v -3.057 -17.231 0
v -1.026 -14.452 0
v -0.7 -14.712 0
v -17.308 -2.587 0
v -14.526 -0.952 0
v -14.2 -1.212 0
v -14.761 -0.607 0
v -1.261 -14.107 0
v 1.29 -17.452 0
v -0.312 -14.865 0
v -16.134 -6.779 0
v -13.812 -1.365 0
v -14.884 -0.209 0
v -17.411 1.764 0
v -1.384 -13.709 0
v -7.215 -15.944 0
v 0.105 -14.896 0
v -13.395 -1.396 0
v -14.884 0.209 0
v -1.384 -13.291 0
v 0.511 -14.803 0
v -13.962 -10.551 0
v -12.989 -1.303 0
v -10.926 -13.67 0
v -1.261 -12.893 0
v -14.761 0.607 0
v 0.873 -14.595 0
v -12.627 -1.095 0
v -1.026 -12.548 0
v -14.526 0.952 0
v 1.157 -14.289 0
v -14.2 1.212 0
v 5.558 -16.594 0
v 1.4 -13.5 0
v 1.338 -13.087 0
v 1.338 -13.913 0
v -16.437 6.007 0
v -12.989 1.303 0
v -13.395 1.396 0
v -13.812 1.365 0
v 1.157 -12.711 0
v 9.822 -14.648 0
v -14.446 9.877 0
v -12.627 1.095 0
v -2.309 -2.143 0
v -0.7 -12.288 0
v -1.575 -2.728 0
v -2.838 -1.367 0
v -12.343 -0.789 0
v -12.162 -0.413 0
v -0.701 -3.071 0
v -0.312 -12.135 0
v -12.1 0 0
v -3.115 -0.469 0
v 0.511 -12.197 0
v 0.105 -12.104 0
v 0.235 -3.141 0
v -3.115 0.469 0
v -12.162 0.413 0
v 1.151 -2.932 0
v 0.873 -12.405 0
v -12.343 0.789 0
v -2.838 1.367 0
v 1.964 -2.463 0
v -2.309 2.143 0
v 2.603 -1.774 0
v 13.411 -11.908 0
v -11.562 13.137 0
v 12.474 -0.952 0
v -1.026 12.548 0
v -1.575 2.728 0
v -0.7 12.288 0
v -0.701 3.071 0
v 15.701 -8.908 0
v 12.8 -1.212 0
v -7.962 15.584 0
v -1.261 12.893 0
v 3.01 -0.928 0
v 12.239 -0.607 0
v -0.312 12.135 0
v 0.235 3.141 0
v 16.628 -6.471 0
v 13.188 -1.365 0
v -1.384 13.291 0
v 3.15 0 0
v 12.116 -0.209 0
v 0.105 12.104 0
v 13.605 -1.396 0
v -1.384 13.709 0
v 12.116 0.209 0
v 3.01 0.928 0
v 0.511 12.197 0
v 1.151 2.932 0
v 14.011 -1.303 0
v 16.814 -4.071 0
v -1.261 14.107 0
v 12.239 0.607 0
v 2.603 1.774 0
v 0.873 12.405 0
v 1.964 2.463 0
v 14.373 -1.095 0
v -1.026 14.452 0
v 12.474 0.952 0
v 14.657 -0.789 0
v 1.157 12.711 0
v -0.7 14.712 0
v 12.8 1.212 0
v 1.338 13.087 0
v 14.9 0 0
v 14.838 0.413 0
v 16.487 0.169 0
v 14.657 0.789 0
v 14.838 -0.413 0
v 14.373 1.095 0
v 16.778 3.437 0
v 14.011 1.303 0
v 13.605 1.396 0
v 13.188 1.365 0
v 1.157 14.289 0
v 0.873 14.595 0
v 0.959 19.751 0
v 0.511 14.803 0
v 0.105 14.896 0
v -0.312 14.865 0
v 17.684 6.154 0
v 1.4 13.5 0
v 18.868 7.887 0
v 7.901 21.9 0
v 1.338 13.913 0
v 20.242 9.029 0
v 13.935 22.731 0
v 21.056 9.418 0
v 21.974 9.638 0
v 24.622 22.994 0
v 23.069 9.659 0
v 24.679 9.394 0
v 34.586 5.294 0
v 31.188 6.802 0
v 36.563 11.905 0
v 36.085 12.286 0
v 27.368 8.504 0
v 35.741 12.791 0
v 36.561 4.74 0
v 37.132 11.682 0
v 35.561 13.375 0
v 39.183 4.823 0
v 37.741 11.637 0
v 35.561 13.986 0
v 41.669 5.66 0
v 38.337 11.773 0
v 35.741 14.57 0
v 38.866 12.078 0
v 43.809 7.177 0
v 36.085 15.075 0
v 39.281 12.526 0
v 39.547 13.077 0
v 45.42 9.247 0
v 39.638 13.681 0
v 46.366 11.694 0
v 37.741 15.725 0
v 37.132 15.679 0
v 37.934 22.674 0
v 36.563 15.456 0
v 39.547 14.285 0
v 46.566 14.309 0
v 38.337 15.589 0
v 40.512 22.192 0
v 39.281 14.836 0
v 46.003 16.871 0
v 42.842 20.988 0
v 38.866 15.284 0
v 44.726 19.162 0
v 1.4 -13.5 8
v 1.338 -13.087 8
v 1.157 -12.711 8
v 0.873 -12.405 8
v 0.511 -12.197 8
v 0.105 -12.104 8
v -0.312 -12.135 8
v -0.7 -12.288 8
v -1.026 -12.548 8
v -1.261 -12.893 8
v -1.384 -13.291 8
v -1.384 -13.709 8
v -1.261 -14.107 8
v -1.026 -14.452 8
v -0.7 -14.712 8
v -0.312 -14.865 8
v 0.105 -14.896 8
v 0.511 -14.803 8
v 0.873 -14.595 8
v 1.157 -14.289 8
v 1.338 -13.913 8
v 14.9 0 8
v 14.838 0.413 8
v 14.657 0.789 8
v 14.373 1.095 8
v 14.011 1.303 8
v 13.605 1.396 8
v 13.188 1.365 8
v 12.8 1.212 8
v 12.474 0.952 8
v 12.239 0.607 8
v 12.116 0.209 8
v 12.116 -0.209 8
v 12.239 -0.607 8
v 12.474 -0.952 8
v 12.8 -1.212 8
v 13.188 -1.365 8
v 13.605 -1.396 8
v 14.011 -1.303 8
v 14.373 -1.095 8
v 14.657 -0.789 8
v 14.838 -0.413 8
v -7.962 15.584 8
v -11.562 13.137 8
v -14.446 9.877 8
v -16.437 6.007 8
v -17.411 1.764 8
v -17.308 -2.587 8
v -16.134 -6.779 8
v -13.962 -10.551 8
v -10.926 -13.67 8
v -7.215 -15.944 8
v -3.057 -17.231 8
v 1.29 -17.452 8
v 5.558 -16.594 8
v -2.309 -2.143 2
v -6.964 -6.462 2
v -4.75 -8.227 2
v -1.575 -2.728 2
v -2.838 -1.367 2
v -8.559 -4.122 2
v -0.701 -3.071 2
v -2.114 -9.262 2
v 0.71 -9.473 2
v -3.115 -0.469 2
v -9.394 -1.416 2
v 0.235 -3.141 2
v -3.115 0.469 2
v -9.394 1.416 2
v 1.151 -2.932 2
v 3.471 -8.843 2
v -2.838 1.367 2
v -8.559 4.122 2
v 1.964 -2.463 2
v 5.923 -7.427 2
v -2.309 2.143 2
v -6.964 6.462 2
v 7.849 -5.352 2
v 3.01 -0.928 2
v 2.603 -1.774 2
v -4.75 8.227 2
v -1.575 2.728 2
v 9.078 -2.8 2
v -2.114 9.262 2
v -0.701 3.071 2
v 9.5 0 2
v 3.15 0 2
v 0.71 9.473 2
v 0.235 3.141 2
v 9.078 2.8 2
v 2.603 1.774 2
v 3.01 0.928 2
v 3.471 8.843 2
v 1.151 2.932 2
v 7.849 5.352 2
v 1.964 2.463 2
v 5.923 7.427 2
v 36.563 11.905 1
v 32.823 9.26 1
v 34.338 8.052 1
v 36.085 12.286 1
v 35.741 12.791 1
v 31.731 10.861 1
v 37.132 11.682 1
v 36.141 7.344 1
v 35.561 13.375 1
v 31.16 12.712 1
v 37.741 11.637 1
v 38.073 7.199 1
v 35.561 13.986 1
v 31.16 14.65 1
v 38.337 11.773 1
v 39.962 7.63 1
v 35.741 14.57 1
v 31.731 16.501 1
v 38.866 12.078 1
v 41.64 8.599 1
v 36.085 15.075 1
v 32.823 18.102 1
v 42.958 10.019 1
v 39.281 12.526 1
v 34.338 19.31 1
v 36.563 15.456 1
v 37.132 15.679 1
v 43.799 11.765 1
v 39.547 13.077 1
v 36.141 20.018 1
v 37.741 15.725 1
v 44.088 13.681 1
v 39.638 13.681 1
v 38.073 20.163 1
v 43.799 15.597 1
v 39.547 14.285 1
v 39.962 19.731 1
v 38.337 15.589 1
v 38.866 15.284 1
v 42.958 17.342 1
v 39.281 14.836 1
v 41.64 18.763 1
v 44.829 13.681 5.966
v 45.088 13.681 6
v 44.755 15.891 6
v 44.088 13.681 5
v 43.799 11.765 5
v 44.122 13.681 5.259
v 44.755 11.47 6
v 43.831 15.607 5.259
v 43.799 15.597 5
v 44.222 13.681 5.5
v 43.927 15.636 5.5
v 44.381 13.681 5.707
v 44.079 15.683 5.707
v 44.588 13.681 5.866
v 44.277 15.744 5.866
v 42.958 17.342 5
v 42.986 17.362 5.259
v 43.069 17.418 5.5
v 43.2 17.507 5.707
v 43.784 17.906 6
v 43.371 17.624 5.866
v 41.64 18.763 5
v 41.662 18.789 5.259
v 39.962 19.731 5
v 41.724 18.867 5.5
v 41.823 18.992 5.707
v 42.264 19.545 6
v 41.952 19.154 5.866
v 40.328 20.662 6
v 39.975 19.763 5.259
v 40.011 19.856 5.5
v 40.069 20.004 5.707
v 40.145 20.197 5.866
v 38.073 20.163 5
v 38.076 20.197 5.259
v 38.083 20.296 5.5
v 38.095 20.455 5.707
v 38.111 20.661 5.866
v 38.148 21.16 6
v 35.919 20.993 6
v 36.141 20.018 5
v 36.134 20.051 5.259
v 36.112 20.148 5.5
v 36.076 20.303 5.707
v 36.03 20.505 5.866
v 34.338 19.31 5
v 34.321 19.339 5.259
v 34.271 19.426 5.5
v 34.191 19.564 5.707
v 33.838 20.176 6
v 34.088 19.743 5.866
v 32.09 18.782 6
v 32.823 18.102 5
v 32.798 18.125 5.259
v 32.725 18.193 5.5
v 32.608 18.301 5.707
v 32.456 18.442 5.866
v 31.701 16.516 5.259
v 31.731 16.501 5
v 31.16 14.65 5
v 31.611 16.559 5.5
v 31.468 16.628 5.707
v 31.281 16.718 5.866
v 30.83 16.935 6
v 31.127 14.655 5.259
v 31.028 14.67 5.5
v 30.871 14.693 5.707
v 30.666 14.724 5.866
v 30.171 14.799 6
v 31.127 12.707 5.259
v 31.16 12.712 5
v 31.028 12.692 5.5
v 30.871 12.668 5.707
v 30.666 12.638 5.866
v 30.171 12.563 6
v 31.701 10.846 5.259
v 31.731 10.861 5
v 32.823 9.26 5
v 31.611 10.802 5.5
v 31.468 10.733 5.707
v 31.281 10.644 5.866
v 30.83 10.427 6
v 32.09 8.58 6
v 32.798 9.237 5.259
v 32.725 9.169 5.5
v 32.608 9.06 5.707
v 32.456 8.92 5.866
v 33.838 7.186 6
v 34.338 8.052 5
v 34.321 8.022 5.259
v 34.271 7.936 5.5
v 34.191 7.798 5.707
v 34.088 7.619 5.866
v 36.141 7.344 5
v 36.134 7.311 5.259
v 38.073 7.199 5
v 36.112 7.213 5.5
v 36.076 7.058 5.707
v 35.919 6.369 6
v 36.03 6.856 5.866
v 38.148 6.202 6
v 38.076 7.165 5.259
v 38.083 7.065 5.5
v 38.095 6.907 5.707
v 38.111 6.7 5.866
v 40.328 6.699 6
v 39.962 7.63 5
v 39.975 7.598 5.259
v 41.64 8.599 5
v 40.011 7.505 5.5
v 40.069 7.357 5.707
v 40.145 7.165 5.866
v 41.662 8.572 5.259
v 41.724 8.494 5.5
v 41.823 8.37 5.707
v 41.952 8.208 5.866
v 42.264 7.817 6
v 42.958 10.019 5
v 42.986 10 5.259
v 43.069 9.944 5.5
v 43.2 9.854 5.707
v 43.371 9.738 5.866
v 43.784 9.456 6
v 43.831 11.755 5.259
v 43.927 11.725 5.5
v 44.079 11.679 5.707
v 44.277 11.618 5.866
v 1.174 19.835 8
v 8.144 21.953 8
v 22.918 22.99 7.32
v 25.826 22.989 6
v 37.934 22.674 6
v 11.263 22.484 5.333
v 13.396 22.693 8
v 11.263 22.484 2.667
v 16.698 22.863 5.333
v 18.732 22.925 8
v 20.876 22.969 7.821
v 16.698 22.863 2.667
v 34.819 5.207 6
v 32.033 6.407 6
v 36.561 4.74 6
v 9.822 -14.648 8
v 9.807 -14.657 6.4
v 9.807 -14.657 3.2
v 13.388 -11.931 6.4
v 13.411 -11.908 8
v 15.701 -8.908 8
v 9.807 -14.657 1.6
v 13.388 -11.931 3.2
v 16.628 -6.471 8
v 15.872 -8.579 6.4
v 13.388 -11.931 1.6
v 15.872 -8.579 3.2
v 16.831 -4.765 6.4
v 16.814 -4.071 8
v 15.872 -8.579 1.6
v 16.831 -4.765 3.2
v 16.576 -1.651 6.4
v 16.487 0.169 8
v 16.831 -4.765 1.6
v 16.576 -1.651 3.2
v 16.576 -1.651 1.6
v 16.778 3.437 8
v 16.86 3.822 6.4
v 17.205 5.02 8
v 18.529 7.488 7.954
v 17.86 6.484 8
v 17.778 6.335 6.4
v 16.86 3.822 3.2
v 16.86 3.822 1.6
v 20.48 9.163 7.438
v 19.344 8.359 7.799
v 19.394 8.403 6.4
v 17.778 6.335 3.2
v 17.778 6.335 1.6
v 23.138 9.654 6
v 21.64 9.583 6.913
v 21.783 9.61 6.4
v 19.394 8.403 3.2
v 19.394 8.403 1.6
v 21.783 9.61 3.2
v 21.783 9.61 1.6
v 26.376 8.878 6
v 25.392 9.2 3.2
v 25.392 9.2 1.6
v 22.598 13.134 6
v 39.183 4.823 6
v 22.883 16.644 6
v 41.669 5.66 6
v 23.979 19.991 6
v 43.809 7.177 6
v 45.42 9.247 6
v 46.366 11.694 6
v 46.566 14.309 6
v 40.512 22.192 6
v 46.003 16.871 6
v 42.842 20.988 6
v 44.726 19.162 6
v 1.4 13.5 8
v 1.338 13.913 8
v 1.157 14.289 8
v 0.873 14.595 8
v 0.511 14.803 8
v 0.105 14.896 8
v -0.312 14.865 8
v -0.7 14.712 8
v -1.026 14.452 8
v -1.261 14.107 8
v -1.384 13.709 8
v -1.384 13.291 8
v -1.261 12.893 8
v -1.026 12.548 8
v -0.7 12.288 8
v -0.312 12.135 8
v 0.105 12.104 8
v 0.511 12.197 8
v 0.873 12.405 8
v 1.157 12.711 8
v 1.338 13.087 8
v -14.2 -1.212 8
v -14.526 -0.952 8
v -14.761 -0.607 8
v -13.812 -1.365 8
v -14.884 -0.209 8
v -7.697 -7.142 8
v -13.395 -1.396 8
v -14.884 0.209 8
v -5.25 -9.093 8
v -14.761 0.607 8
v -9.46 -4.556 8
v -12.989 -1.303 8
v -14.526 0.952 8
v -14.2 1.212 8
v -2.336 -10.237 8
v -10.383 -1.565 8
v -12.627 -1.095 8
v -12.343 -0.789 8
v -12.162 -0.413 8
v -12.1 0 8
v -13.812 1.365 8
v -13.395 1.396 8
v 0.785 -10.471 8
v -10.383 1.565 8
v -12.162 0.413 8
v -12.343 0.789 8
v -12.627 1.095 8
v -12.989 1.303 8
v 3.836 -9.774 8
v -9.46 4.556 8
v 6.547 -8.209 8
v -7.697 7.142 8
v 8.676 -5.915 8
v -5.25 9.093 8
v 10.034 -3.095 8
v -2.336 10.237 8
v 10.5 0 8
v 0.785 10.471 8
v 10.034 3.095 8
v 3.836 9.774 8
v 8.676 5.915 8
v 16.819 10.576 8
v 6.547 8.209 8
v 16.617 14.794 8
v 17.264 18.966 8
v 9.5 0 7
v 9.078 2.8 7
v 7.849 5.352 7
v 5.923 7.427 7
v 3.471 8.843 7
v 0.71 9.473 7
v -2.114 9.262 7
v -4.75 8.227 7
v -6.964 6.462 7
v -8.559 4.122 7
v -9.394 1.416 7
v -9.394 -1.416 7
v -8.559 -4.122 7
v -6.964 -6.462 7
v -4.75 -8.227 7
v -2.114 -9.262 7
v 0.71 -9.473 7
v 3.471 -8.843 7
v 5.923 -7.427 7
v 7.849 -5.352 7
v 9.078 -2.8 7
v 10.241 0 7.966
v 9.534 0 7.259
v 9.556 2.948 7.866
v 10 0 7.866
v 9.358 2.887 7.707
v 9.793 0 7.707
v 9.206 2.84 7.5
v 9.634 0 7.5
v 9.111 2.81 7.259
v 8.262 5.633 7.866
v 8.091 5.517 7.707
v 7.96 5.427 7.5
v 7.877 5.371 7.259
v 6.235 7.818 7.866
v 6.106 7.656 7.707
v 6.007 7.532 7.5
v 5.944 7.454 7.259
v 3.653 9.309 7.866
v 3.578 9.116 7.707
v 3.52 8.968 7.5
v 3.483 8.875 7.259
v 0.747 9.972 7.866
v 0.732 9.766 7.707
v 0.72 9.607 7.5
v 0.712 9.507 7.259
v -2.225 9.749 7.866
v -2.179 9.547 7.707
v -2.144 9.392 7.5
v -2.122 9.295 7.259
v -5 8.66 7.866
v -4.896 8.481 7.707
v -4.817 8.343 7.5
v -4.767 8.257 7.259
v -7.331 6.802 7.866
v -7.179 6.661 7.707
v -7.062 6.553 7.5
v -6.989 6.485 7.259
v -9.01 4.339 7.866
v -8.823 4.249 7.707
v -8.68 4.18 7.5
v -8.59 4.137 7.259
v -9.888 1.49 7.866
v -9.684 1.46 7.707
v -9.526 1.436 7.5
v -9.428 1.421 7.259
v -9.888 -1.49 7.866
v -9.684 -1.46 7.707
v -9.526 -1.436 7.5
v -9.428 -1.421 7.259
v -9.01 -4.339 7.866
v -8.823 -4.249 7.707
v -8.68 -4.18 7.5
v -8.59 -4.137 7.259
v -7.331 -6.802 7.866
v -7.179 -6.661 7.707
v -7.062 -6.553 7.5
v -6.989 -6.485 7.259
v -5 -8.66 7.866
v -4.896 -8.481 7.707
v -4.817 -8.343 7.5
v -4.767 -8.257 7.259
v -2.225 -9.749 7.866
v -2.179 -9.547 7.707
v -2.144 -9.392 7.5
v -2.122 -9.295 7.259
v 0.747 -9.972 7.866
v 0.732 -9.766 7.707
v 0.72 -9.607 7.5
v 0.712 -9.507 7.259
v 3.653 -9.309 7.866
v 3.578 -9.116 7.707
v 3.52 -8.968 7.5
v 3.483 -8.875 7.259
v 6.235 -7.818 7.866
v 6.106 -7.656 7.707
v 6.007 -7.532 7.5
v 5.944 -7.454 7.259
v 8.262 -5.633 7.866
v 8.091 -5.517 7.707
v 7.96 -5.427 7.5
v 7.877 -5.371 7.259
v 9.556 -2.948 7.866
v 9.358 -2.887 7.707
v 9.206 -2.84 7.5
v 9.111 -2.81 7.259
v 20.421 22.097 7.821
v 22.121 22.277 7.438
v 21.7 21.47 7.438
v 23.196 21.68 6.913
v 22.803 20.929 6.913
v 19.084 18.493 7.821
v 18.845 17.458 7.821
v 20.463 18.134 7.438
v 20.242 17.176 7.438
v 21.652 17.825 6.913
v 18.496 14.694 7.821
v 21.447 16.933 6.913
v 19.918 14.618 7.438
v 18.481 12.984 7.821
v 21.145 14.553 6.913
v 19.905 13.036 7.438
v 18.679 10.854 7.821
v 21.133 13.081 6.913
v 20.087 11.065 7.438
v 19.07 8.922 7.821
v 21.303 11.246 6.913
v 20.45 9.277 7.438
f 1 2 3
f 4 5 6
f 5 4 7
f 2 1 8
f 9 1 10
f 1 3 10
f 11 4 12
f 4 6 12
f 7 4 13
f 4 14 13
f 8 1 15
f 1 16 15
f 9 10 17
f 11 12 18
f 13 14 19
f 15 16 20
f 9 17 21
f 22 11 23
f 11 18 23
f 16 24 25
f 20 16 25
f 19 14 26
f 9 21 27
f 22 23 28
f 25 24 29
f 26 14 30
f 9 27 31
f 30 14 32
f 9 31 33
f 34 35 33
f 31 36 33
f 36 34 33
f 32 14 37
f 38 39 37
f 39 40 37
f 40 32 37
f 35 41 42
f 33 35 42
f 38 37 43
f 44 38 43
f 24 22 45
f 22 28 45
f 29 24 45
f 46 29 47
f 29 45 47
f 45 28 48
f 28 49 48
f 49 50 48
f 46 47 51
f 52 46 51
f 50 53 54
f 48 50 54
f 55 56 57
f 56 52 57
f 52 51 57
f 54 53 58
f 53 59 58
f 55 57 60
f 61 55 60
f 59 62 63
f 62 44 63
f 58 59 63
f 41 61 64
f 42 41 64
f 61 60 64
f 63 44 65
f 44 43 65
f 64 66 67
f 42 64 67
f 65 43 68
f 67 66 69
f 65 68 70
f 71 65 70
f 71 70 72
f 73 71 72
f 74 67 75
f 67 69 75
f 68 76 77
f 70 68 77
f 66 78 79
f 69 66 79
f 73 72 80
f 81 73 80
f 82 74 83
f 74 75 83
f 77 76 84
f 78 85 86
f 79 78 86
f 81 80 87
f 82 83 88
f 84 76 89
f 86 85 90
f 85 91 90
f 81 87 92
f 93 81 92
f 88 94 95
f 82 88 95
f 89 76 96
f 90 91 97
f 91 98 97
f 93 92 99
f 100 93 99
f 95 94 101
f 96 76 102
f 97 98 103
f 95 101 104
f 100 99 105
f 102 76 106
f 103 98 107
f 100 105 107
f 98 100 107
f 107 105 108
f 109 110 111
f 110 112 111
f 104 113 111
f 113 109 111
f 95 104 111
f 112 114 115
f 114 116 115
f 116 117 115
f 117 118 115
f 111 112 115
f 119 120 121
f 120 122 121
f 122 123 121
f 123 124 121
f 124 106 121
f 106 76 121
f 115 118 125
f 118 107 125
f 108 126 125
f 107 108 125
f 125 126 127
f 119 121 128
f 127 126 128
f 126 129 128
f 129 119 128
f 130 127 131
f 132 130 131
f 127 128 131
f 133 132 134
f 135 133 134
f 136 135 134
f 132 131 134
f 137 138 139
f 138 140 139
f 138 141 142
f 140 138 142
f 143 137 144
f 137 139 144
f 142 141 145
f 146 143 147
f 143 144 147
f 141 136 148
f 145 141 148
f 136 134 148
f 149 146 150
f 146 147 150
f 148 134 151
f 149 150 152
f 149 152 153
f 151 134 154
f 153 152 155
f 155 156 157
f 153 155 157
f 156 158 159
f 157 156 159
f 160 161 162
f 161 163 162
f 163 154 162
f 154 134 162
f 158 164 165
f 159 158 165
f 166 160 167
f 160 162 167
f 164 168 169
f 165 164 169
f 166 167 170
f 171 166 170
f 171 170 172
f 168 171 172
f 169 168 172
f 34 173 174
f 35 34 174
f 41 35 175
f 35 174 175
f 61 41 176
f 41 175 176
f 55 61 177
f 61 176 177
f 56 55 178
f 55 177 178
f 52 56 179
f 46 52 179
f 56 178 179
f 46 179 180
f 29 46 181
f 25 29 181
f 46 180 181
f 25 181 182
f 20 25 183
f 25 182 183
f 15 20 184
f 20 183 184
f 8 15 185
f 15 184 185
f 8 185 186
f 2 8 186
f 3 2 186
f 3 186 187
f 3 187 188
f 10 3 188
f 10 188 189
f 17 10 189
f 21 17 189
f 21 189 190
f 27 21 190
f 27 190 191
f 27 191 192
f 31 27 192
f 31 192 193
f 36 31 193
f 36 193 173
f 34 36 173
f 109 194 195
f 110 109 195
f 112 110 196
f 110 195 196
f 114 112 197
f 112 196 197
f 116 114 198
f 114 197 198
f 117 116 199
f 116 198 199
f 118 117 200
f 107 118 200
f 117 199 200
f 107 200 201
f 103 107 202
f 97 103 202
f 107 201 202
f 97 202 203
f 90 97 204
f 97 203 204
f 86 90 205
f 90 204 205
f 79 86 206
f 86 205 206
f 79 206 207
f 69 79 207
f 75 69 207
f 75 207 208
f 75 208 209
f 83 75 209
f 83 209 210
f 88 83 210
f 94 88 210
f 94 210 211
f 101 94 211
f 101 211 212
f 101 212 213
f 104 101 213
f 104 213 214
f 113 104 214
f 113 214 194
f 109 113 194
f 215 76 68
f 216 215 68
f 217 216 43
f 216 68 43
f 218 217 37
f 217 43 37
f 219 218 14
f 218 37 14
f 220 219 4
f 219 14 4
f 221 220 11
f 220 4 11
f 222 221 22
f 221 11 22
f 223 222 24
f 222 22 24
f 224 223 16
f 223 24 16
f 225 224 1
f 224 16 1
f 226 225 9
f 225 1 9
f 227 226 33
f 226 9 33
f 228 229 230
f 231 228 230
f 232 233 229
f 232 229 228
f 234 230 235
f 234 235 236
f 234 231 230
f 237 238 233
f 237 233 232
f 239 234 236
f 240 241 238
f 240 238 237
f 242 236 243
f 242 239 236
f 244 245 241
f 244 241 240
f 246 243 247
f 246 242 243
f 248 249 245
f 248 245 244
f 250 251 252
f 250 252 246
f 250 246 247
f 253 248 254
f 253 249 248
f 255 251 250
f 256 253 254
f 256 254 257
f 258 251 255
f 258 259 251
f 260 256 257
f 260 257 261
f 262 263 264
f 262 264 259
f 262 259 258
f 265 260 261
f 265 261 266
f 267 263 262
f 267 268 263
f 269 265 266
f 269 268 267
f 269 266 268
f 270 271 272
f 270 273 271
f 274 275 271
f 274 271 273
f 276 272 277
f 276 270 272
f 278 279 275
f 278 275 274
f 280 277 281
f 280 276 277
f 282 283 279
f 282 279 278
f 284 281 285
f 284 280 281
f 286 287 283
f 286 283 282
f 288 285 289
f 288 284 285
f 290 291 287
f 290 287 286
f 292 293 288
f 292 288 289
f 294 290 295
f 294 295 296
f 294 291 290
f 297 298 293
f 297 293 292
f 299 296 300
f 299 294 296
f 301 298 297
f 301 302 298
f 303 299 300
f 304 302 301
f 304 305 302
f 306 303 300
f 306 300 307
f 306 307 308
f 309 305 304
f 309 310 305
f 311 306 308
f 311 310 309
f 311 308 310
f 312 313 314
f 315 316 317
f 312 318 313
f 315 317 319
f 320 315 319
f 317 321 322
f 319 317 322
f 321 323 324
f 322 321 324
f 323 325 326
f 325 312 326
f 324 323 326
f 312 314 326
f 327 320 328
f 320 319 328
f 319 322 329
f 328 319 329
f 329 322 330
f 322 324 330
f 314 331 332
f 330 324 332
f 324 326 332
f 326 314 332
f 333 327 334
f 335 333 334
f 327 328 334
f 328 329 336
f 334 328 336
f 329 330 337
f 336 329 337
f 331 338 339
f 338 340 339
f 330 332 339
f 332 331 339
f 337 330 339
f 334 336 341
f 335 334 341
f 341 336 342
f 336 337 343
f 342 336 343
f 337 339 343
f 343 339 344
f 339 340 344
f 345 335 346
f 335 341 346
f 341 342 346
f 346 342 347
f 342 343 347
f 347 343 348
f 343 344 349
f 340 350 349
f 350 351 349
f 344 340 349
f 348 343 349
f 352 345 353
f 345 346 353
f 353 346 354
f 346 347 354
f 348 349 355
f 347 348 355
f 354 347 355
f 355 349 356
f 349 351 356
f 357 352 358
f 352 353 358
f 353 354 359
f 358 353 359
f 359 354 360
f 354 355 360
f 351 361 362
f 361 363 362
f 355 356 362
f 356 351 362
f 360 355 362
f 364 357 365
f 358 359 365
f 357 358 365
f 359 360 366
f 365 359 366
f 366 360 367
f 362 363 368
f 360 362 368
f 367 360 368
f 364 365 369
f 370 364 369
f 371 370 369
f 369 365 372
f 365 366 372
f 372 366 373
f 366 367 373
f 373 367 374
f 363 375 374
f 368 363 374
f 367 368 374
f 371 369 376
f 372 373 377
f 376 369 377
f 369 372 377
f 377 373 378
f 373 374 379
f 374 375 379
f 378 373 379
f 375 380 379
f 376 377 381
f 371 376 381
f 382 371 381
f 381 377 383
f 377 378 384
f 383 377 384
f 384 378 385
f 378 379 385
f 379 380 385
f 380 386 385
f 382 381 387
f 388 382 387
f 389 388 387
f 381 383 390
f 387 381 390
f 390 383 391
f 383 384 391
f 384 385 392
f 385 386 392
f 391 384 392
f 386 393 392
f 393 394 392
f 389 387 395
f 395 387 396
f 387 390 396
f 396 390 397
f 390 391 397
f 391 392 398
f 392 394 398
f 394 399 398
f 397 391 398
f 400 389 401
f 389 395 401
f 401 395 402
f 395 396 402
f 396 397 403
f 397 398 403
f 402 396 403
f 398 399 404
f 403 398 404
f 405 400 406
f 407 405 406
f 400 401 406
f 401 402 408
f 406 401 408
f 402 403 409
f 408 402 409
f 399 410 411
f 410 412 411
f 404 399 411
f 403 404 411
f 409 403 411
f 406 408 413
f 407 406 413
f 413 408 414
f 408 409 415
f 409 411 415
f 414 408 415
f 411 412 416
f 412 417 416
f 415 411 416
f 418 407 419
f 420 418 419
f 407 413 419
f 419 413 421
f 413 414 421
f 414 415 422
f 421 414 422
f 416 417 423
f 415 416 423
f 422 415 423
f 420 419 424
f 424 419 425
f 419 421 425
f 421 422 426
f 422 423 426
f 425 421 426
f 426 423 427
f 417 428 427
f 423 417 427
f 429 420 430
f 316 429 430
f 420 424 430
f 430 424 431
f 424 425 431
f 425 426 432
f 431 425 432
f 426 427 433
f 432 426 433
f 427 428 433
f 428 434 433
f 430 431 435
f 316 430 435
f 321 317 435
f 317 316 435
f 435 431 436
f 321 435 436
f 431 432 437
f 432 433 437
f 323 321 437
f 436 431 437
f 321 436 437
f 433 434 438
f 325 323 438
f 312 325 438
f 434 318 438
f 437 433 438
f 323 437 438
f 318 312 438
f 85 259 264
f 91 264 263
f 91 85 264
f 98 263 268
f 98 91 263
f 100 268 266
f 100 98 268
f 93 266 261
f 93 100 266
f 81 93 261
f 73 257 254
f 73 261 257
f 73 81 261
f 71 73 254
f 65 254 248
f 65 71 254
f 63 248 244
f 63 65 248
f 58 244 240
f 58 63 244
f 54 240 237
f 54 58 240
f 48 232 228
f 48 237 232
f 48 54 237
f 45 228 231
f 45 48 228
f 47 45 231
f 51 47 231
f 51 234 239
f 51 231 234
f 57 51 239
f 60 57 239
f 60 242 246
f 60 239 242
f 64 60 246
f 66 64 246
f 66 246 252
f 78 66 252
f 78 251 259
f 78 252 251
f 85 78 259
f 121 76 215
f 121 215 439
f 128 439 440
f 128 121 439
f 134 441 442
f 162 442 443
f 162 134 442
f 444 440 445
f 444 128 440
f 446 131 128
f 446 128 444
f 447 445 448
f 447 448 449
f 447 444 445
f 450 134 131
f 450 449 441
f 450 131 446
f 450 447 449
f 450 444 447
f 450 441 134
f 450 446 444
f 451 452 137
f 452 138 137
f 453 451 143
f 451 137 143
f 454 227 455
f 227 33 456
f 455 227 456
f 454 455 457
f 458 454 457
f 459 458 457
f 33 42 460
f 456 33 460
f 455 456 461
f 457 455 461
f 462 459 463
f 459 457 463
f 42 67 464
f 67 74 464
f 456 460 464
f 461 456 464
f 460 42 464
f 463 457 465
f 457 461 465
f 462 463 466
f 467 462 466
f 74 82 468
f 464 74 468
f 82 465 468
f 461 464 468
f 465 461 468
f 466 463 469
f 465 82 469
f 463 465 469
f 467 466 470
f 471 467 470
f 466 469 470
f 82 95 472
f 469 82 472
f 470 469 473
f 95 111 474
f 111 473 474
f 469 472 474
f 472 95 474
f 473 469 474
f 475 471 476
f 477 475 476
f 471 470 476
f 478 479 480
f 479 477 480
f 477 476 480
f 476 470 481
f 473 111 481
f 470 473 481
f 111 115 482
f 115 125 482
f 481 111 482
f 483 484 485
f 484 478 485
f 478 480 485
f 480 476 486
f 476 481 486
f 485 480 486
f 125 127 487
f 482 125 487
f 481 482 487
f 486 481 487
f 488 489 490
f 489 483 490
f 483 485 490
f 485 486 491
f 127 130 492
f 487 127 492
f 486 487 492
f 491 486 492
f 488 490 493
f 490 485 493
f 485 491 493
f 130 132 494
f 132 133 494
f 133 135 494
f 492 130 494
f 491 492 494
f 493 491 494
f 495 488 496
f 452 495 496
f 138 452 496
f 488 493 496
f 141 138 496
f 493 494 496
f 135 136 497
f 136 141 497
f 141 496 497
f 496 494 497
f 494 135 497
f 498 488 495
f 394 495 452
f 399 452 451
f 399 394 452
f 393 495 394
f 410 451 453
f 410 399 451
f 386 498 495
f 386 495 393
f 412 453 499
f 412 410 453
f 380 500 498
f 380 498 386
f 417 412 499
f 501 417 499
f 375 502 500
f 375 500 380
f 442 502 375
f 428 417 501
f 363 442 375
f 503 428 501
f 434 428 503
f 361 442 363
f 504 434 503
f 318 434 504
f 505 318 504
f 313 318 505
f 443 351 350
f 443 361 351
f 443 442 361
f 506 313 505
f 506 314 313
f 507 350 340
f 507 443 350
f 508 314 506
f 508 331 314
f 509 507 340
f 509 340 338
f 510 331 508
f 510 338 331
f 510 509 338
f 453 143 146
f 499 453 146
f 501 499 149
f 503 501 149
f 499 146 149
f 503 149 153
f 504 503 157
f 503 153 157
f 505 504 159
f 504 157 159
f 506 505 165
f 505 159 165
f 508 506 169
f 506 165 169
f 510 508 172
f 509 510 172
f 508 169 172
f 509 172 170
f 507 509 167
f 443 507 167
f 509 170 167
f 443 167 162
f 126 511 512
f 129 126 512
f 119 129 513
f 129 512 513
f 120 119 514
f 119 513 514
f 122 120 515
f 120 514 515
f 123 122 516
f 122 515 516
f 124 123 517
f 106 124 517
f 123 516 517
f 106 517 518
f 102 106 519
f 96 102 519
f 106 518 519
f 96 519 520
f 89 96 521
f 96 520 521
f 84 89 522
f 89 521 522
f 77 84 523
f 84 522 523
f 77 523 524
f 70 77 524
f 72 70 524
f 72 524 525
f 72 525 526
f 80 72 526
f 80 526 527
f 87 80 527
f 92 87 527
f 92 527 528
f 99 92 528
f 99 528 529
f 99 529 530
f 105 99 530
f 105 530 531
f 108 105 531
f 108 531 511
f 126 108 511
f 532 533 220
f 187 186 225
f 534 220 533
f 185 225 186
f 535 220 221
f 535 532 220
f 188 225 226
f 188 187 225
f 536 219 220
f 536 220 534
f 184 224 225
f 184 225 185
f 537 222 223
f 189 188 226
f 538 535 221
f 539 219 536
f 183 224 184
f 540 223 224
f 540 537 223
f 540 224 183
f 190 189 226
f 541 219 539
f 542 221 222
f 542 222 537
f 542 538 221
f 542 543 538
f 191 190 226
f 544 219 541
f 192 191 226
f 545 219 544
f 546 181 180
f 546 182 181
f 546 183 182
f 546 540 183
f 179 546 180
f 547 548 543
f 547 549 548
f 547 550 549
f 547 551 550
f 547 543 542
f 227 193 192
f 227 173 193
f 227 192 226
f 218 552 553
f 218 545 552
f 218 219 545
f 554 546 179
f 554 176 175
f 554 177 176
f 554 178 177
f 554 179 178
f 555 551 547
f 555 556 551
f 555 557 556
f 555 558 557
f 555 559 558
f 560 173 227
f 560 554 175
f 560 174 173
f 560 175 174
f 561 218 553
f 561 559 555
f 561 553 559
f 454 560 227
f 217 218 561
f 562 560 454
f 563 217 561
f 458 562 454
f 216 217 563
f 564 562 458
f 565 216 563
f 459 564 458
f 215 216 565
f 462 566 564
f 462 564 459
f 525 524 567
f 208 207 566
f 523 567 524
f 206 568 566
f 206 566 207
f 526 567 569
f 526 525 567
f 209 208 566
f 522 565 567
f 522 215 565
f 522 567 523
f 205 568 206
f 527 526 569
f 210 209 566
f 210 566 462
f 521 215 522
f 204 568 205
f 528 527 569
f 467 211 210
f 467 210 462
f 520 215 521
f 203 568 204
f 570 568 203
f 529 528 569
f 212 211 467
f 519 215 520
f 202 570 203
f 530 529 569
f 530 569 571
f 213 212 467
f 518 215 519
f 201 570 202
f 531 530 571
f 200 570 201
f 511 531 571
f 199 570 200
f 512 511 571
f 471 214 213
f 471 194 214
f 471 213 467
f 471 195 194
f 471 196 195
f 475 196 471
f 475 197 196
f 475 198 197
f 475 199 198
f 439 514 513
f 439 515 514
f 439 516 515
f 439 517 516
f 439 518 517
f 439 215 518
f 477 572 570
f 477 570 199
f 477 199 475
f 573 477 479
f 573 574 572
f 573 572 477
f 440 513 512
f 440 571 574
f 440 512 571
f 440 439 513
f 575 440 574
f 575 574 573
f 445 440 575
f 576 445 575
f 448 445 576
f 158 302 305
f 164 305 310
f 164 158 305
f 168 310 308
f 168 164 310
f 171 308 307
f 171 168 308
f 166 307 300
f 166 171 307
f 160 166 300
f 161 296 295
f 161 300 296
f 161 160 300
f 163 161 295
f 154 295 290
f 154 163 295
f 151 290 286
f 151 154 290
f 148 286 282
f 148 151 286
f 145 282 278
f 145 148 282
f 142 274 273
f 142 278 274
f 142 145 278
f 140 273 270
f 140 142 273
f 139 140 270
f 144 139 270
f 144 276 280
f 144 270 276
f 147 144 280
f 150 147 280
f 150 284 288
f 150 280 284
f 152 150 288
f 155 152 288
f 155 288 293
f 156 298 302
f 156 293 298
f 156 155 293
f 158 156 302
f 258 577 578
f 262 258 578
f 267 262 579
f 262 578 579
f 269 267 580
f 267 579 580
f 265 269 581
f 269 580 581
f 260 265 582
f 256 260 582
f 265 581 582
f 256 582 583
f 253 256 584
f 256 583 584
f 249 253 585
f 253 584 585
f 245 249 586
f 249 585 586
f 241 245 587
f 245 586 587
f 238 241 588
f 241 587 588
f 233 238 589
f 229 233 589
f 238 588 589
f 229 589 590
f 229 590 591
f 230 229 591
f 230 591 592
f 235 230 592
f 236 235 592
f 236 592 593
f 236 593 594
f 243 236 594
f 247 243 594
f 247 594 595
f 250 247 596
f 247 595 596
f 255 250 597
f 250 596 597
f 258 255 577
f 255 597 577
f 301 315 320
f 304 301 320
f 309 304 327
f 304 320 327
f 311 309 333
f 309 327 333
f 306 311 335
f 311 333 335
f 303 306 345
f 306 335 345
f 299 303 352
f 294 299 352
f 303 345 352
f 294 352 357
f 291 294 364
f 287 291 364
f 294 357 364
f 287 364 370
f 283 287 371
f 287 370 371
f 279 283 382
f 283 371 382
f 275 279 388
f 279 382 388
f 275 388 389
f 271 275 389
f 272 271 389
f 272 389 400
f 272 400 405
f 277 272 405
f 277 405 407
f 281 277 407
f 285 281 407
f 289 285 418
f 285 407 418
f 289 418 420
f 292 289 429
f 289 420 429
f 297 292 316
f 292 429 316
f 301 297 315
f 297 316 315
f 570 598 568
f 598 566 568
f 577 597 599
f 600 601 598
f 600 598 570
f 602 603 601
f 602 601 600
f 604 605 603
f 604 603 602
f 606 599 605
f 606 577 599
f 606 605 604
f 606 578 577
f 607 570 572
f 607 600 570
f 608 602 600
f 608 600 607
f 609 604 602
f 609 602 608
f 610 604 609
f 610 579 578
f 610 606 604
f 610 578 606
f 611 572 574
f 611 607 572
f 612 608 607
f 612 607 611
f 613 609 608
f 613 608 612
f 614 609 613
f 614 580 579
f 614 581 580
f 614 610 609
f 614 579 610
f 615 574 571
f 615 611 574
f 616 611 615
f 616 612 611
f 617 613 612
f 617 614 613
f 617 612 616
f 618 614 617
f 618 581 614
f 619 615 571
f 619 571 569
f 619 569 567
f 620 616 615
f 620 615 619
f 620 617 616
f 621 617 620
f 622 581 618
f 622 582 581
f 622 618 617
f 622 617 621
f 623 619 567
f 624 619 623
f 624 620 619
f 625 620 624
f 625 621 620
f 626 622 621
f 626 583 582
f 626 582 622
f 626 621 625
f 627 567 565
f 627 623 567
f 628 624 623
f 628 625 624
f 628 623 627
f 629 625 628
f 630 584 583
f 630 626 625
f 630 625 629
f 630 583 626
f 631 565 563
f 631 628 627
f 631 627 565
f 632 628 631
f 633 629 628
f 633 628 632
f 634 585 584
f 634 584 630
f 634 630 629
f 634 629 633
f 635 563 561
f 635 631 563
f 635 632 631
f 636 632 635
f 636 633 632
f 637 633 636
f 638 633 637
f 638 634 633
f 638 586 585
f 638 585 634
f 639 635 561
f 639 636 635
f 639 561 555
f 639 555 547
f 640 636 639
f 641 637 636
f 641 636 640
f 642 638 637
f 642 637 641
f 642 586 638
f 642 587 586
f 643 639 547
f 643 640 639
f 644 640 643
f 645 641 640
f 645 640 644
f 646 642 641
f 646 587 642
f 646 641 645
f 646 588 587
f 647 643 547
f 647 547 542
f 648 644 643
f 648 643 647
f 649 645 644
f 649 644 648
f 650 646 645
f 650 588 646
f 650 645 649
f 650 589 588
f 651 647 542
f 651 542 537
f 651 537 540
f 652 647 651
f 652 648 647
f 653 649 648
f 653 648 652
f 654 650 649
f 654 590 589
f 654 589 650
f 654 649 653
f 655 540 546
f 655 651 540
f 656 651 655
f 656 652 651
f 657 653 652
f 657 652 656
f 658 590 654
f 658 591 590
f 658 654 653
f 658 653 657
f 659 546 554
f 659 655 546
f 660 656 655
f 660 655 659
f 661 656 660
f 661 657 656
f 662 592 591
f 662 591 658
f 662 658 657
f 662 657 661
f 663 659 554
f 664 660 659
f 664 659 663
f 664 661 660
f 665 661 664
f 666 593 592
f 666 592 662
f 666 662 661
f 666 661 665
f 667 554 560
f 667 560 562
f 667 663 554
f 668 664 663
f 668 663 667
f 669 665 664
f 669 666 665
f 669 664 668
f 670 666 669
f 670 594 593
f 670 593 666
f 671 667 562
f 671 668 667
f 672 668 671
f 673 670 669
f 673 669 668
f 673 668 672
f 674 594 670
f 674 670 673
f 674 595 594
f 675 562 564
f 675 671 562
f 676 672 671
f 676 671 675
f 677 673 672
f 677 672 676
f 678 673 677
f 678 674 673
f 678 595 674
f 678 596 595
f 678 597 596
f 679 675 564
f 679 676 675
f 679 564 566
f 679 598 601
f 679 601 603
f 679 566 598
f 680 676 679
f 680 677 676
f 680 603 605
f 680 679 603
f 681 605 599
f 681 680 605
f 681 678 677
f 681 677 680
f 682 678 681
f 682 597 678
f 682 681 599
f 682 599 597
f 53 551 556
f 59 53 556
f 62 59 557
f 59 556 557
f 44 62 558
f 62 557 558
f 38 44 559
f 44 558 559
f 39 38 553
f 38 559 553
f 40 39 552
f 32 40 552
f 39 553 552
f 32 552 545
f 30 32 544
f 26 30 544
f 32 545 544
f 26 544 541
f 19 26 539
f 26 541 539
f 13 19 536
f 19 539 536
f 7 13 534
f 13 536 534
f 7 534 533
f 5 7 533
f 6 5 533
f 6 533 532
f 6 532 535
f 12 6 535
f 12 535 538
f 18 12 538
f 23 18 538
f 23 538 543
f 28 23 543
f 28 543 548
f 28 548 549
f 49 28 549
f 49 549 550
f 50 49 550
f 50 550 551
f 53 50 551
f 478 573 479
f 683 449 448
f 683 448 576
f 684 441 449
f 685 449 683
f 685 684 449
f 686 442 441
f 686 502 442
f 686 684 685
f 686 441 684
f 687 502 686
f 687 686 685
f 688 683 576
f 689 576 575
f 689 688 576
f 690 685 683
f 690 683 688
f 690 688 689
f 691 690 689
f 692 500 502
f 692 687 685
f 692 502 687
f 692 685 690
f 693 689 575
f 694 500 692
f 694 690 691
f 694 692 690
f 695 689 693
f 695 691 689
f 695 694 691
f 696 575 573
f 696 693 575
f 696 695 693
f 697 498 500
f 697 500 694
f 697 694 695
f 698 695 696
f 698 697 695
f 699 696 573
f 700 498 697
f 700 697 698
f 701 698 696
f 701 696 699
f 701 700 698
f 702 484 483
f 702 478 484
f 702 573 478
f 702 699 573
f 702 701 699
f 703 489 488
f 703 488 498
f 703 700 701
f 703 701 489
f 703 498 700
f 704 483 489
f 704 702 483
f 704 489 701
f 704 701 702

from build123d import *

# Parameters (mm, degrees)
SKETCH1_R           = 6.5
SKETCH1_R_2         = 9.5
SKETCH1_R_3         = 3.15
SKETCH1_R_4         = 2.05
BOSS_EXTRUDE1_DEPTH = 8
SKETCH2_R           = 1.4
CUT_EXTRUDE1_DEPTH  = 10
SKETCH3_R           = 9.5
CUT_EXTRUDE2_DEPTH  = 6
CUT_EXTRUDE3_START  = -2
CUT_EXTRUDE3_DEPTH  = 2
SKETCH6_R           = 6.5
CUT_EXTRUDE4_DEPTH  = 5
FILLET1_R           = 10
FILLET3_R           = 1
FILLET4_R           = 1


with BuildPart() as part:
    # Sketch1 → Boss-Extrude1 (new body)
    # profile 1 of 3: a face of its own
    with BuildSketch(Plane.XY):
        with BuildLine():
            ThreePointArc((-7.96176738, 15.583974467), (-16.133848008, -6.77856537), (5.557683878, -16.59403959))
            add(Edge.make_bspline(
                [(5.557683878, -16.59403959), (11.479074635, -14.610844493), (17.751405143, -9.234245164), (16.115757619, 0.631694436), (16.825810009, 7.052286054), (24.274178409, 11.505601391), (33.300706558, 5.113807946), (36.561337581, 4.739521135)],
                knots=[0, 0, 0, 0, 0.382951965, 0.45496999, 0.690712447, 0.748162229, 1, 1, 1, 1], degree=3))
            ThreePointArc((36.561337581, 4.739521135), (46.561462901, 12.994026209), (37.933909918, 22.674144492))
            add(Edge.make_bspline(
                [(-7.96176738, 15.583974467), (-3.039767553, 18.098597277), (5.12659712, 22.317732547), (23.583922654, 23.226880319), (32.652703513, 22.877448356), (37.933909918, 22.674144492)],
                knots=[0, 0, 0, 0, 0.429359774, 0.529359774, 1, 1, 1, 1], degree=3))
        make_face()
        with Locations((37.587704831, 13.680805733)):
            Circle(SKETCH1_R, mode=Mode.SUBTRACT)
        Circle(SKETCH1_R_2, mode=Mode.SUBTRACT)
    # profile 2 of 3: a face of its own
    with BuildSketch(Plane.XY):
        Circle(SKETCH1_R_2)
        Circle(SKETCH1_R_3, mode=Mode.SUBTRACT)
    # profile 3 of 3: a face of its own
    with BuildSketch(Plane.XY):
        with Locations((37.587704831, 13.680805733)):
            Circle(SKETCH1_R)
        with Locations((37.587704831, 13.680805733)):
            Circle(SKETCH1_R_4, mode=Mode.SUBTRACT)
    extrude(amount=BOSS_EXTRUDE1_DEPTH)

    # Sketch2 → Cut-Extrude1 (cut)
    with BuildSketch(Plane.XY.offset(8)):
        with Locations((0, 13.5)):
            Circle(SKETCH2_R)
        with Locations((13.5, 0)):
            Circle(SKETCH2_R)
        with Locations((0, -13.5)):
            Circle(SKETCH2_R)
        with Locations((-13.5, 0)):
            Circle(SKETCH2_R)
    extrude(amount=-CUT_EXTRUDE1_DEPTH, mode=Mode.SUBTRACT)

    # Sketch3 → Cut-Extrude2 (cut)
    with BuildSketch(Plane.XY.offset(8)):
        Circle(SKETCH3_R)
    extrude(amount=-CUT_EXTRUDE2_DEPTH, mode=Mode.SUBTRACT)

    # Sketch5 → Cut-Extrude3 (cut)
    with BuildSketch(Plane.XY.offset(8).offset(CUT_EXTRUDE3_START)):
        with BuildLine():
            ThreePointArc((25.825503891, 22.989437697), (22.883298202, 16.643984039), (23.138245926, 9.654251705))
            add(Edge.make_bspline(
                [(23.138245926, 9.654251705), (27.396044405, 9.314768535), (33.630557167, 5.075944498), (36.561337581, 4.739521135)],
                knots=[0.773638537, 0.773638537, 0.773638537, 0.773638537, 1, 1, 1, 1], degree=3))
            ThreePointArc((36.561337581, 4.739521135), (46.561462901, 12.994026209), (37.933909918, 22.674144492))
            add(Edge.make_bspline(
                [(37.933909918, 22.674144492), (34.650963076, 22.800523908), (30.51852808, 22.959707824), (25.825503891, 22.989437697)],
                knots=[0, 0, 0, 0, 0.292563237, 0.292563237, 0.292563237, 0.292563237], degree=3))
        make_face()
    extrude(amount=CUT_EXTRUDE3_DEPTH, mode=Mode.SUBTRACT)

    # Sketch6 → Cut-Extrude4 (cut)
    with BuildSketch(Plane.XY.offset(6)):
        with Locations((37.587704831, 13.680805733)):
            Circle(SKETCH6_R)
    extrude(amount=-CUT_EXTRUDE4_DEPTH, mode=Mode.SUBTRACT)

    # Fillet1
    # the kernel refuses this fillet: 10 mm, written as the material it takes off along each edge
    with BuildSketch(Plane(origin=(37.587704831, 13.680805733, 8), x_dir=(0.09866346978303978, 0.9951208568462281, 0), z_dir=(0.9951208568462281, -0.09866346978303978, 0))) as fillet1_piece_1:
        with BuildLine():
            CenterArc((21, -10), FILLET1_R, 90, 36.869897646)
            Line((21, 0), (21, 0.2))
            Line((21, 0.2), (15, 0.2))
            Line((15, 0.2), (14.8, 0))
            ThreePointArc((14.8, 0), (14.8, -1), (14.88, -1.84))
            Line((14.88, -1.84), (15, -2))
        make_face()
    revolve(axis=Axis((37.587704831, 13.680805733, 8), (0, 0, 1)), revolution_arc=168.537531078, mode=Mode.SUBTRACT)

    # Fillet3
    fillet3_edges = [part.edges().sort_by_distance(p)[0] for p in [
        (31.087704831, 13.680805733, 6),
    ]]
    fillet(fillet3_edges, radius=FILLET3_R)

    # Fillet4
    fillet4_edges = [part.edges().sort_by_distance(p)[0] for p in [
        (-9.5, 0, 8),
    ]]
    fillet(fillet4_edges, radius=FILLET4_R)


solid = part.part
